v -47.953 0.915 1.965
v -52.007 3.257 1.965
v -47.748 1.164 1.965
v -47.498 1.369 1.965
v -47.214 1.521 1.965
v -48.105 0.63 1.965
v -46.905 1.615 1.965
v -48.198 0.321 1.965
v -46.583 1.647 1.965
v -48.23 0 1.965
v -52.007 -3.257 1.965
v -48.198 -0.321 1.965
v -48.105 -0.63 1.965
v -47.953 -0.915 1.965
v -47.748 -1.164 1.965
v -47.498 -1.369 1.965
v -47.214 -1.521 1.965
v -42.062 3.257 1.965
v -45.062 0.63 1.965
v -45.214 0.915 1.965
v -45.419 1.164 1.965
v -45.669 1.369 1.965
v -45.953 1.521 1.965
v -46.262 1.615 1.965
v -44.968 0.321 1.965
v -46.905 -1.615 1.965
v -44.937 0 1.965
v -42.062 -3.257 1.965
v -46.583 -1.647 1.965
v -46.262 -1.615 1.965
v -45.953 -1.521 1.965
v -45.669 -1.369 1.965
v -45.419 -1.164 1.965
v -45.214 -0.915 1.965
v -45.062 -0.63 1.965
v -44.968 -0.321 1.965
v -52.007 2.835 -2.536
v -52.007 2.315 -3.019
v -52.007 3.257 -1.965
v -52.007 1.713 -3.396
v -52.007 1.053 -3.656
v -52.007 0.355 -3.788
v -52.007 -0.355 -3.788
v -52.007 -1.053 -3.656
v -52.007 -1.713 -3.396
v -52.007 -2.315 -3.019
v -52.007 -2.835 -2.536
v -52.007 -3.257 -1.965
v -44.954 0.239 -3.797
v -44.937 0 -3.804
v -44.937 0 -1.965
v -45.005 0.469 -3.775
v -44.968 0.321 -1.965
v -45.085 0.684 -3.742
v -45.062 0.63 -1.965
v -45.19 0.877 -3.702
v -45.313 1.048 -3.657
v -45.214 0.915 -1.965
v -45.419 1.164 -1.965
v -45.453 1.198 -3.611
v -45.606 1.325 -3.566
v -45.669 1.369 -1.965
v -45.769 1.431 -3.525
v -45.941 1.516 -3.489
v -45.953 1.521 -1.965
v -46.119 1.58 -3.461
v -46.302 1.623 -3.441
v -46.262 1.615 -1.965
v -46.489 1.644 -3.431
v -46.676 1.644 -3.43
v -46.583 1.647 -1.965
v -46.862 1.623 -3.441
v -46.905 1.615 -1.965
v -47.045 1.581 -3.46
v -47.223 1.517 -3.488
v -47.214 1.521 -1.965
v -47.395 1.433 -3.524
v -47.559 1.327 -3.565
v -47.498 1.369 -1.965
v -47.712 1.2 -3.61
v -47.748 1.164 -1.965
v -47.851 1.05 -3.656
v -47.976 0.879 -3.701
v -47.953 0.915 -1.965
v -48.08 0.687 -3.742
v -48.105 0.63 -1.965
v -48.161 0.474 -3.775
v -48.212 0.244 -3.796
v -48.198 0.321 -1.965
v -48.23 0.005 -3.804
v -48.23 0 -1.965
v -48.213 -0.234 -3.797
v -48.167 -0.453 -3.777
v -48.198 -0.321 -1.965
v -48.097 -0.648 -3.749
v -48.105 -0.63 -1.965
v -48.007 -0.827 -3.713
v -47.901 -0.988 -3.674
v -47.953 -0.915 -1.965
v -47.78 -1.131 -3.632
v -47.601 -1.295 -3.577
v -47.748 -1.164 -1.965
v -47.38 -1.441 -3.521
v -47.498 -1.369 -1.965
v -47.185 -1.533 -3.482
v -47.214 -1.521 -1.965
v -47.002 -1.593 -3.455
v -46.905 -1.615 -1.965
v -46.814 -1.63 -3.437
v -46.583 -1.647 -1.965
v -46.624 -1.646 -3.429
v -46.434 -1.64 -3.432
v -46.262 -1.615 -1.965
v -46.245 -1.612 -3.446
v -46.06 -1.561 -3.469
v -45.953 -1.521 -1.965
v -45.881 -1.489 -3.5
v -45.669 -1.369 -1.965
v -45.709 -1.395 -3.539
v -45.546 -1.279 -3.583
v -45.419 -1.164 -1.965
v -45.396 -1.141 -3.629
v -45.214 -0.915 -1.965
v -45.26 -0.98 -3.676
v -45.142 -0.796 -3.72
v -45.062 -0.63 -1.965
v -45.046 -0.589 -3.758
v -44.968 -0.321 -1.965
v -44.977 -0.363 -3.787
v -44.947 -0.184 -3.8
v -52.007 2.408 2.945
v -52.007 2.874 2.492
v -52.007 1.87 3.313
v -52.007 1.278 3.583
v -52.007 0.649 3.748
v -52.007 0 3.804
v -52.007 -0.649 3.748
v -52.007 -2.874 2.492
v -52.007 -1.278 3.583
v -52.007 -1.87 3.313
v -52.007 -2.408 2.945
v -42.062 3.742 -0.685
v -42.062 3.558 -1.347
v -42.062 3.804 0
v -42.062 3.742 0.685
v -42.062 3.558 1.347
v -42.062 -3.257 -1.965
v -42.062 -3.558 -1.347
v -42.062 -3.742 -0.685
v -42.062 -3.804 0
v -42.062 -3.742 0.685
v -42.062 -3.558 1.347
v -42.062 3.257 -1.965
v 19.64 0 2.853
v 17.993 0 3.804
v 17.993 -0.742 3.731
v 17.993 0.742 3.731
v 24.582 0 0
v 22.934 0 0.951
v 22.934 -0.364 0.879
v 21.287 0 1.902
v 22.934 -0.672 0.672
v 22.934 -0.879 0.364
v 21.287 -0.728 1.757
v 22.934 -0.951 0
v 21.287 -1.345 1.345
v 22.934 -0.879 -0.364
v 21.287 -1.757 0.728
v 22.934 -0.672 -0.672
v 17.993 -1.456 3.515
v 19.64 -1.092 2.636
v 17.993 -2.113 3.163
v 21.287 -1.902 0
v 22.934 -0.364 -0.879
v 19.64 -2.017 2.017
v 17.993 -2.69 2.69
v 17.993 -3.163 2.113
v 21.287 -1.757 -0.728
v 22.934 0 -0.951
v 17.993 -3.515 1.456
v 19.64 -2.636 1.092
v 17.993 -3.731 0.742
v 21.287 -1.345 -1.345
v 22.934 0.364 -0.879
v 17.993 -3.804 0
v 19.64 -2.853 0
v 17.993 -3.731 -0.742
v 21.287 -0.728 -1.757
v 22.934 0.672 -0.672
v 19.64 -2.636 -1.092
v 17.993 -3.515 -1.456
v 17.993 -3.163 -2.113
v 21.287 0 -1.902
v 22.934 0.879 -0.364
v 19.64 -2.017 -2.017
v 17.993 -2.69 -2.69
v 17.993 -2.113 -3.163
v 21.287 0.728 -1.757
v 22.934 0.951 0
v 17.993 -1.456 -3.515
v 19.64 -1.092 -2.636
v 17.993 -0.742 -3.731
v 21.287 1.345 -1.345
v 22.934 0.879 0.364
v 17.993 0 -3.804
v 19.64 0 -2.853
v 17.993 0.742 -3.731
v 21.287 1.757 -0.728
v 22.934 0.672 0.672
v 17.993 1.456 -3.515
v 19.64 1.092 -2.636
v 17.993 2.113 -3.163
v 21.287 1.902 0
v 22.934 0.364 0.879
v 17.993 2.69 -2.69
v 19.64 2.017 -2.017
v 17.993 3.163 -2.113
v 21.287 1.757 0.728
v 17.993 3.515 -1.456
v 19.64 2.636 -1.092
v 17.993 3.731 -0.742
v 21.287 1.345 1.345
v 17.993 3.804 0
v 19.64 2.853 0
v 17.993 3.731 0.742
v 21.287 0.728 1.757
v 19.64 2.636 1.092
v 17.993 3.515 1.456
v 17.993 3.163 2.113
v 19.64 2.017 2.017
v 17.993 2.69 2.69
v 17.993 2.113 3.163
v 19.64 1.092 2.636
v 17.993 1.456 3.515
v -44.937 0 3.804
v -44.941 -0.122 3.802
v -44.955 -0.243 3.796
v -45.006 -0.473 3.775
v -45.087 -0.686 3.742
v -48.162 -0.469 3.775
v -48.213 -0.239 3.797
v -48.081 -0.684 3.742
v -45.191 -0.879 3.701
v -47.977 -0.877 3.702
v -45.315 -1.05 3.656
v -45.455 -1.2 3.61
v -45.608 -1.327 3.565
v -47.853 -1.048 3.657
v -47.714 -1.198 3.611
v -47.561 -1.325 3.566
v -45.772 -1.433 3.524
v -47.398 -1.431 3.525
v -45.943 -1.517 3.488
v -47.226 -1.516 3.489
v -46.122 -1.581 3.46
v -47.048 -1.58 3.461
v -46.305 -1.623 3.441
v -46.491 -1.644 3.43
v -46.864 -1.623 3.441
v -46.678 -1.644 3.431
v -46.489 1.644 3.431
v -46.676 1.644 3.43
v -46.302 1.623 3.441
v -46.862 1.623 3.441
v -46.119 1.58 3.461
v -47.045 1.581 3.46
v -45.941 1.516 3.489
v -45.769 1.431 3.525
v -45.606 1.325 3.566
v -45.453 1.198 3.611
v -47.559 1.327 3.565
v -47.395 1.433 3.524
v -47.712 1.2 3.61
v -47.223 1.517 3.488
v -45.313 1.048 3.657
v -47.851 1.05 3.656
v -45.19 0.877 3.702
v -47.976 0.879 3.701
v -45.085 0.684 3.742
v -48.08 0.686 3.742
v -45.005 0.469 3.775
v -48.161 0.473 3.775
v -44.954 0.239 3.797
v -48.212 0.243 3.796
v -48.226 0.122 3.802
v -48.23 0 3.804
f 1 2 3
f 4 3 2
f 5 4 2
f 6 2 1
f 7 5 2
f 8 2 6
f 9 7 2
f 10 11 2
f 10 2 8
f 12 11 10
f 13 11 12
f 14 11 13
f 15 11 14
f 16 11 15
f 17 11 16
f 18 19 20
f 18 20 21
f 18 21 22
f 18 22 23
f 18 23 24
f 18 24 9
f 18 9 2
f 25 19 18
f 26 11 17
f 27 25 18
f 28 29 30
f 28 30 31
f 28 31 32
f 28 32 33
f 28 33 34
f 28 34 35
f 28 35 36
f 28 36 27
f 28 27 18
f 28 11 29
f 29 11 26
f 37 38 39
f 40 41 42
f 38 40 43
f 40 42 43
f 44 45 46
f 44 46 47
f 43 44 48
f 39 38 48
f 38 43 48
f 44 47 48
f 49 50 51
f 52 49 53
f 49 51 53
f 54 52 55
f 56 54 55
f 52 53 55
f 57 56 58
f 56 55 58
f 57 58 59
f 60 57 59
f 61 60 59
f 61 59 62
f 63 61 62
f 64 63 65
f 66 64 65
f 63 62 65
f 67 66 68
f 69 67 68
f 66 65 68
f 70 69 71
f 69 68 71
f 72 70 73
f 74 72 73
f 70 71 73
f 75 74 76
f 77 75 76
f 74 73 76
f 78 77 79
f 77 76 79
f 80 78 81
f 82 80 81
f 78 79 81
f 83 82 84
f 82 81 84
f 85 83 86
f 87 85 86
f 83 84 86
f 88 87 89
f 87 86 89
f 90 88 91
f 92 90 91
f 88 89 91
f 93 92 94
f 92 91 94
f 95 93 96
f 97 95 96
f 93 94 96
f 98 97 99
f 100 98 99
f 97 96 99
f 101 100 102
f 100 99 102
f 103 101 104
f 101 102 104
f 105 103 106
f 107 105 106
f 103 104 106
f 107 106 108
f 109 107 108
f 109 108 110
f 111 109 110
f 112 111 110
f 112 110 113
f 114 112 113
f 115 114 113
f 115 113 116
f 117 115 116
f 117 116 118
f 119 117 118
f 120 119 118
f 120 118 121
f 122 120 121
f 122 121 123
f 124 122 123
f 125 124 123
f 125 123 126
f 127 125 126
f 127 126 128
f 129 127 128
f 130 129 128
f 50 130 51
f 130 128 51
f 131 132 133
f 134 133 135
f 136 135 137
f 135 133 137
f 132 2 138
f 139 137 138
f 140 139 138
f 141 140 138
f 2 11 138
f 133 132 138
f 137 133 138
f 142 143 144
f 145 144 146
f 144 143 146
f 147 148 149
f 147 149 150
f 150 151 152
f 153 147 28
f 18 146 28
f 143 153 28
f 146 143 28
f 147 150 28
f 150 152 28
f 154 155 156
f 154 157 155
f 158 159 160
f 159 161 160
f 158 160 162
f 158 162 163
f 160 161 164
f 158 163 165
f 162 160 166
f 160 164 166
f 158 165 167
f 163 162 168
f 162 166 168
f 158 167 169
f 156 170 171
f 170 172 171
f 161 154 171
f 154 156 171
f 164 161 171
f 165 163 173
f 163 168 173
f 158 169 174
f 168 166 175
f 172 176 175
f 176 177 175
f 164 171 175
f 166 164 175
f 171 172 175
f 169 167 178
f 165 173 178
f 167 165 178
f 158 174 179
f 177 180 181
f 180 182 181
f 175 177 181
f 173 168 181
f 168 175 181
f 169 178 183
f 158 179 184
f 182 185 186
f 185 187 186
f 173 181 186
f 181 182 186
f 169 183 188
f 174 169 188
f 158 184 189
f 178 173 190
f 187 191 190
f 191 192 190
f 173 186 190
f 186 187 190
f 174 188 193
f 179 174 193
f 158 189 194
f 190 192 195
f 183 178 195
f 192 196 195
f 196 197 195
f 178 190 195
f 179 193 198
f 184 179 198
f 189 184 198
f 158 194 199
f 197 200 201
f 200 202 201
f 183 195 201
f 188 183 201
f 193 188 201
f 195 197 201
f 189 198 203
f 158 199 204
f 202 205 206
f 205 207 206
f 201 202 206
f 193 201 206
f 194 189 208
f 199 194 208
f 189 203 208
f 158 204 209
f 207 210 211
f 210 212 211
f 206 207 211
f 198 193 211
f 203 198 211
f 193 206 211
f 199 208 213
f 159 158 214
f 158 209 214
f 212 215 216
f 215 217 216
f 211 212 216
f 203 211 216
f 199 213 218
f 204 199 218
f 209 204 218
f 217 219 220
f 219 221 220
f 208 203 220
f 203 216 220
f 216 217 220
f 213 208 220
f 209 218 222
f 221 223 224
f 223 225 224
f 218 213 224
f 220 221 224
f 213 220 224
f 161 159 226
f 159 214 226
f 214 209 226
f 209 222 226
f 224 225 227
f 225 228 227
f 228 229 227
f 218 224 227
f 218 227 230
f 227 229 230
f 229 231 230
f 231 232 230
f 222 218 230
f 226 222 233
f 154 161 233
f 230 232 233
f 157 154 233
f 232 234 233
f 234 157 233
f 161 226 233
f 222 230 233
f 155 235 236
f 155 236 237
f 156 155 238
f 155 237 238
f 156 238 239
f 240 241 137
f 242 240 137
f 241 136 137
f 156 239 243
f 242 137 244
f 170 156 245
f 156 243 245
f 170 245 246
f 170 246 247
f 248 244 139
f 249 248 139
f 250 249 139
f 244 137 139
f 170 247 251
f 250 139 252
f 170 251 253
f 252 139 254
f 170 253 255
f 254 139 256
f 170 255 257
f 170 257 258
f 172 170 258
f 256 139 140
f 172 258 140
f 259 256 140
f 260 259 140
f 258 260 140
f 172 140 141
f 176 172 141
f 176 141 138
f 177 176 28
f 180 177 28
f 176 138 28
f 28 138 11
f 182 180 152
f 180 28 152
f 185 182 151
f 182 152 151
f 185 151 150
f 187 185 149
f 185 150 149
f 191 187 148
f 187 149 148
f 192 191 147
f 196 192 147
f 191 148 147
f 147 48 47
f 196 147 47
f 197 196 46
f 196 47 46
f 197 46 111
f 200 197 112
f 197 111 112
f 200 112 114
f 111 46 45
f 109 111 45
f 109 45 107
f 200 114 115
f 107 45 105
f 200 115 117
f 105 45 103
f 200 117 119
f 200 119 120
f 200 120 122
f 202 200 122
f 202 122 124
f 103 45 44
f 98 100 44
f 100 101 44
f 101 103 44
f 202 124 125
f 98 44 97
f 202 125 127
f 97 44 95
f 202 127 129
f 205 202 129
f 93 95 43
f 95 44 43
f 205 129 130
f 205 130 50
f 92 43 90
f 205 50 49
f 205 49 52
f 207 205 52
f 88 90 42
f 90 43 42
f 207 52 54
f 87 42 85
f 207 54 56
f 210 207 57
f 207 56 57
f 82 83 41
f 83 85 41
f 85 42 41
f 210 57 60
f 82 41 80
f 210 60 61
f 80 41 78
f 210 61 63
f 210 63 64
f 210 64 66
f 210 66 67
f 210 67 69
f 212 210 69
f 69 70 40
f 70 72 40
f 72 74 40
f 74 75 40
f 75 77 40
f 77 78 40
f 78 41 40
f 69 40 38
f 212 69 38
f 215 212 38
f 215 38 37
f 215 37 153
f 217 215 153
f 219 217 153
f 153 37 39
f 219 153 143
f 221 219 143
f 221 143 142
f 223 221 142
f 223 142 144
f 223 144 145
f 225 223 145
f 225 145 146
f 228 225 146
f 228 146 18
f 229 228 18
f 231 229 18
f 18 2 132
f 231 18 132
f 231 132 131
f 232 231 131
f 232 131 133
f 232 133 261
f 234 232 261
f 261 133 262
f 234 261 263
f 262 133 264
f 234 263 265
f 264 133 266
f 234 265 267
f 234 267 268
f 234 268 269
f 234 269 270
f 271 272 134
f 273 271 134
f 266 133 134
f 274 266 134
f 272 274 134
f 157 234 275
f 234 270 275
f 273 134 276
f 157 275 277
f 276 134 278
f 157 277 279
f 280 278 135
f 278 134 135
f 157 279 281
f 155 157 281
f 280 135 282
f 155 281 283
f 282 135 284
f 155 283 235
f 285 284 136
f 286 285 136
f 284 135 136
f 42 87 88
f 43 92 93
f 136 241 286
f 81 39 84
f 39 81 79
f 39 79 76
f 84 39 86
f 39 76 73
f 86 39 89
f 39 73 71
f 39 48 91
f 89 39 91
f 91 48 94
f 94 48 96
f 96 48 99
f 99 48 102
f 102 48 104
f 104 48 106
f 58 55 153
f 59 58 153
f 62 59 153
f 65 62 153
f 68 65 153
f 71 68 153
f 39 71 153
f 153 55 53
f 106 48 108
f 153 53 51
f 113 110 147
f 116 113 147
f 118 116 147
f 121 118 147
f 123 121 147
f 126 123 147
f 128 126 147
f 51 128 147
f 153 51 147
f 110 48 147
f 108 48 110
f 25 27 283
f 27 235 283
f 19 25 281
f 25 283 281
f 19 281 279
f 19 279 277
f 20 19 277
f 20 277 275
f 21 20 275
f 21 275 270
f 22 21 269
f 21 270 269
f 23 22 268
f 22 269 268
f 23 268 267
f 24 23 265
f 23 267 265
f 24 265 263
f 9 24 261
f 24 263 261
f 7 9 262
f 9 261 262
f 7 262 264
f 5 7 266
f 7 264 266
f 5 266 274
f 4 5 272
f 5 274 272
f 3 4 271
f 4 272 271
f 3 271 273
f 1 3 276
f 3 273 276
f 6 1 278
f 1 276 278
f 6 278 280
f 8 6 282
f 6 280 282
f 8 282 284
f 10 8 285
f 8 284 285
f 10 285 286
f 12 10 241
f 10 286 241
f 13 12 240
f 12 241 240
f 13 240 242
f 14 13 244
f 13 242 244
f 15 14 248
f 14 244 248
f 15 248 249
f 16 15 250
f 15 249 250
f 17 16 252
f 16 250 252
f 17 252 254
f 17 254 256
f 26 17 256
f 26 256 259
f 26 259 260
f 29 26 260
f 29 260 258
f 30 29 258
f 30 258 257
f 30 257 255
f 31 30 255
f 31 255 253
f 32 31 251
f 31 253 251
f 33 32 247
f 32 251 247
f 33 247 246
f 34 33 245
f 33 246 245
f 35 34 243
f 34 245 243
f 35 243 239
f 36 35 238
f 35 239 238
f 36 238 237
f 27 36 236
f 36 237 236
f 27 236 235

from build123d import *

# Parameters (mm, degrees)
F2_W     = 16.304351
F2_H     = 3.93052
F3_DEPTH = 25.4
F4_R     = 1.646658
F5_DEPTH = 25.4


with BuildPart() as f1:
    # F0 (on Front) → F1 (revolve)
    with BuildSketch(Plane.XZ):
        Polygon((-52.007179, 3.804098), (-52.007179, 0), (24.581712, 0), (17.992821, 3.804098), align=None)
    revolve(axis=Axis((-13.712734, 0, 0), (1, 0, 0)))

    # F2 (on Front) → F3 (cut, symmetric)
    with BuildSketch(Plane.XZ):
        with Locations((-50.214119, 0)):
            Rectangle(F2_W, F2_H)
    extrude(amount=F3_DEPTH, both=True, mode=Mode.SUBTRACT)

    # F4 (on Top) → F5 (cut, symmetric)
    with BuildSketch(Plane.XY):
        with Locations((-46.583418, 0)):
            Circle(F4_R)
    extrude(amount=F5_DEPTH, both=True, mode=Mode.SUBTRACT)


solid = f1.part
